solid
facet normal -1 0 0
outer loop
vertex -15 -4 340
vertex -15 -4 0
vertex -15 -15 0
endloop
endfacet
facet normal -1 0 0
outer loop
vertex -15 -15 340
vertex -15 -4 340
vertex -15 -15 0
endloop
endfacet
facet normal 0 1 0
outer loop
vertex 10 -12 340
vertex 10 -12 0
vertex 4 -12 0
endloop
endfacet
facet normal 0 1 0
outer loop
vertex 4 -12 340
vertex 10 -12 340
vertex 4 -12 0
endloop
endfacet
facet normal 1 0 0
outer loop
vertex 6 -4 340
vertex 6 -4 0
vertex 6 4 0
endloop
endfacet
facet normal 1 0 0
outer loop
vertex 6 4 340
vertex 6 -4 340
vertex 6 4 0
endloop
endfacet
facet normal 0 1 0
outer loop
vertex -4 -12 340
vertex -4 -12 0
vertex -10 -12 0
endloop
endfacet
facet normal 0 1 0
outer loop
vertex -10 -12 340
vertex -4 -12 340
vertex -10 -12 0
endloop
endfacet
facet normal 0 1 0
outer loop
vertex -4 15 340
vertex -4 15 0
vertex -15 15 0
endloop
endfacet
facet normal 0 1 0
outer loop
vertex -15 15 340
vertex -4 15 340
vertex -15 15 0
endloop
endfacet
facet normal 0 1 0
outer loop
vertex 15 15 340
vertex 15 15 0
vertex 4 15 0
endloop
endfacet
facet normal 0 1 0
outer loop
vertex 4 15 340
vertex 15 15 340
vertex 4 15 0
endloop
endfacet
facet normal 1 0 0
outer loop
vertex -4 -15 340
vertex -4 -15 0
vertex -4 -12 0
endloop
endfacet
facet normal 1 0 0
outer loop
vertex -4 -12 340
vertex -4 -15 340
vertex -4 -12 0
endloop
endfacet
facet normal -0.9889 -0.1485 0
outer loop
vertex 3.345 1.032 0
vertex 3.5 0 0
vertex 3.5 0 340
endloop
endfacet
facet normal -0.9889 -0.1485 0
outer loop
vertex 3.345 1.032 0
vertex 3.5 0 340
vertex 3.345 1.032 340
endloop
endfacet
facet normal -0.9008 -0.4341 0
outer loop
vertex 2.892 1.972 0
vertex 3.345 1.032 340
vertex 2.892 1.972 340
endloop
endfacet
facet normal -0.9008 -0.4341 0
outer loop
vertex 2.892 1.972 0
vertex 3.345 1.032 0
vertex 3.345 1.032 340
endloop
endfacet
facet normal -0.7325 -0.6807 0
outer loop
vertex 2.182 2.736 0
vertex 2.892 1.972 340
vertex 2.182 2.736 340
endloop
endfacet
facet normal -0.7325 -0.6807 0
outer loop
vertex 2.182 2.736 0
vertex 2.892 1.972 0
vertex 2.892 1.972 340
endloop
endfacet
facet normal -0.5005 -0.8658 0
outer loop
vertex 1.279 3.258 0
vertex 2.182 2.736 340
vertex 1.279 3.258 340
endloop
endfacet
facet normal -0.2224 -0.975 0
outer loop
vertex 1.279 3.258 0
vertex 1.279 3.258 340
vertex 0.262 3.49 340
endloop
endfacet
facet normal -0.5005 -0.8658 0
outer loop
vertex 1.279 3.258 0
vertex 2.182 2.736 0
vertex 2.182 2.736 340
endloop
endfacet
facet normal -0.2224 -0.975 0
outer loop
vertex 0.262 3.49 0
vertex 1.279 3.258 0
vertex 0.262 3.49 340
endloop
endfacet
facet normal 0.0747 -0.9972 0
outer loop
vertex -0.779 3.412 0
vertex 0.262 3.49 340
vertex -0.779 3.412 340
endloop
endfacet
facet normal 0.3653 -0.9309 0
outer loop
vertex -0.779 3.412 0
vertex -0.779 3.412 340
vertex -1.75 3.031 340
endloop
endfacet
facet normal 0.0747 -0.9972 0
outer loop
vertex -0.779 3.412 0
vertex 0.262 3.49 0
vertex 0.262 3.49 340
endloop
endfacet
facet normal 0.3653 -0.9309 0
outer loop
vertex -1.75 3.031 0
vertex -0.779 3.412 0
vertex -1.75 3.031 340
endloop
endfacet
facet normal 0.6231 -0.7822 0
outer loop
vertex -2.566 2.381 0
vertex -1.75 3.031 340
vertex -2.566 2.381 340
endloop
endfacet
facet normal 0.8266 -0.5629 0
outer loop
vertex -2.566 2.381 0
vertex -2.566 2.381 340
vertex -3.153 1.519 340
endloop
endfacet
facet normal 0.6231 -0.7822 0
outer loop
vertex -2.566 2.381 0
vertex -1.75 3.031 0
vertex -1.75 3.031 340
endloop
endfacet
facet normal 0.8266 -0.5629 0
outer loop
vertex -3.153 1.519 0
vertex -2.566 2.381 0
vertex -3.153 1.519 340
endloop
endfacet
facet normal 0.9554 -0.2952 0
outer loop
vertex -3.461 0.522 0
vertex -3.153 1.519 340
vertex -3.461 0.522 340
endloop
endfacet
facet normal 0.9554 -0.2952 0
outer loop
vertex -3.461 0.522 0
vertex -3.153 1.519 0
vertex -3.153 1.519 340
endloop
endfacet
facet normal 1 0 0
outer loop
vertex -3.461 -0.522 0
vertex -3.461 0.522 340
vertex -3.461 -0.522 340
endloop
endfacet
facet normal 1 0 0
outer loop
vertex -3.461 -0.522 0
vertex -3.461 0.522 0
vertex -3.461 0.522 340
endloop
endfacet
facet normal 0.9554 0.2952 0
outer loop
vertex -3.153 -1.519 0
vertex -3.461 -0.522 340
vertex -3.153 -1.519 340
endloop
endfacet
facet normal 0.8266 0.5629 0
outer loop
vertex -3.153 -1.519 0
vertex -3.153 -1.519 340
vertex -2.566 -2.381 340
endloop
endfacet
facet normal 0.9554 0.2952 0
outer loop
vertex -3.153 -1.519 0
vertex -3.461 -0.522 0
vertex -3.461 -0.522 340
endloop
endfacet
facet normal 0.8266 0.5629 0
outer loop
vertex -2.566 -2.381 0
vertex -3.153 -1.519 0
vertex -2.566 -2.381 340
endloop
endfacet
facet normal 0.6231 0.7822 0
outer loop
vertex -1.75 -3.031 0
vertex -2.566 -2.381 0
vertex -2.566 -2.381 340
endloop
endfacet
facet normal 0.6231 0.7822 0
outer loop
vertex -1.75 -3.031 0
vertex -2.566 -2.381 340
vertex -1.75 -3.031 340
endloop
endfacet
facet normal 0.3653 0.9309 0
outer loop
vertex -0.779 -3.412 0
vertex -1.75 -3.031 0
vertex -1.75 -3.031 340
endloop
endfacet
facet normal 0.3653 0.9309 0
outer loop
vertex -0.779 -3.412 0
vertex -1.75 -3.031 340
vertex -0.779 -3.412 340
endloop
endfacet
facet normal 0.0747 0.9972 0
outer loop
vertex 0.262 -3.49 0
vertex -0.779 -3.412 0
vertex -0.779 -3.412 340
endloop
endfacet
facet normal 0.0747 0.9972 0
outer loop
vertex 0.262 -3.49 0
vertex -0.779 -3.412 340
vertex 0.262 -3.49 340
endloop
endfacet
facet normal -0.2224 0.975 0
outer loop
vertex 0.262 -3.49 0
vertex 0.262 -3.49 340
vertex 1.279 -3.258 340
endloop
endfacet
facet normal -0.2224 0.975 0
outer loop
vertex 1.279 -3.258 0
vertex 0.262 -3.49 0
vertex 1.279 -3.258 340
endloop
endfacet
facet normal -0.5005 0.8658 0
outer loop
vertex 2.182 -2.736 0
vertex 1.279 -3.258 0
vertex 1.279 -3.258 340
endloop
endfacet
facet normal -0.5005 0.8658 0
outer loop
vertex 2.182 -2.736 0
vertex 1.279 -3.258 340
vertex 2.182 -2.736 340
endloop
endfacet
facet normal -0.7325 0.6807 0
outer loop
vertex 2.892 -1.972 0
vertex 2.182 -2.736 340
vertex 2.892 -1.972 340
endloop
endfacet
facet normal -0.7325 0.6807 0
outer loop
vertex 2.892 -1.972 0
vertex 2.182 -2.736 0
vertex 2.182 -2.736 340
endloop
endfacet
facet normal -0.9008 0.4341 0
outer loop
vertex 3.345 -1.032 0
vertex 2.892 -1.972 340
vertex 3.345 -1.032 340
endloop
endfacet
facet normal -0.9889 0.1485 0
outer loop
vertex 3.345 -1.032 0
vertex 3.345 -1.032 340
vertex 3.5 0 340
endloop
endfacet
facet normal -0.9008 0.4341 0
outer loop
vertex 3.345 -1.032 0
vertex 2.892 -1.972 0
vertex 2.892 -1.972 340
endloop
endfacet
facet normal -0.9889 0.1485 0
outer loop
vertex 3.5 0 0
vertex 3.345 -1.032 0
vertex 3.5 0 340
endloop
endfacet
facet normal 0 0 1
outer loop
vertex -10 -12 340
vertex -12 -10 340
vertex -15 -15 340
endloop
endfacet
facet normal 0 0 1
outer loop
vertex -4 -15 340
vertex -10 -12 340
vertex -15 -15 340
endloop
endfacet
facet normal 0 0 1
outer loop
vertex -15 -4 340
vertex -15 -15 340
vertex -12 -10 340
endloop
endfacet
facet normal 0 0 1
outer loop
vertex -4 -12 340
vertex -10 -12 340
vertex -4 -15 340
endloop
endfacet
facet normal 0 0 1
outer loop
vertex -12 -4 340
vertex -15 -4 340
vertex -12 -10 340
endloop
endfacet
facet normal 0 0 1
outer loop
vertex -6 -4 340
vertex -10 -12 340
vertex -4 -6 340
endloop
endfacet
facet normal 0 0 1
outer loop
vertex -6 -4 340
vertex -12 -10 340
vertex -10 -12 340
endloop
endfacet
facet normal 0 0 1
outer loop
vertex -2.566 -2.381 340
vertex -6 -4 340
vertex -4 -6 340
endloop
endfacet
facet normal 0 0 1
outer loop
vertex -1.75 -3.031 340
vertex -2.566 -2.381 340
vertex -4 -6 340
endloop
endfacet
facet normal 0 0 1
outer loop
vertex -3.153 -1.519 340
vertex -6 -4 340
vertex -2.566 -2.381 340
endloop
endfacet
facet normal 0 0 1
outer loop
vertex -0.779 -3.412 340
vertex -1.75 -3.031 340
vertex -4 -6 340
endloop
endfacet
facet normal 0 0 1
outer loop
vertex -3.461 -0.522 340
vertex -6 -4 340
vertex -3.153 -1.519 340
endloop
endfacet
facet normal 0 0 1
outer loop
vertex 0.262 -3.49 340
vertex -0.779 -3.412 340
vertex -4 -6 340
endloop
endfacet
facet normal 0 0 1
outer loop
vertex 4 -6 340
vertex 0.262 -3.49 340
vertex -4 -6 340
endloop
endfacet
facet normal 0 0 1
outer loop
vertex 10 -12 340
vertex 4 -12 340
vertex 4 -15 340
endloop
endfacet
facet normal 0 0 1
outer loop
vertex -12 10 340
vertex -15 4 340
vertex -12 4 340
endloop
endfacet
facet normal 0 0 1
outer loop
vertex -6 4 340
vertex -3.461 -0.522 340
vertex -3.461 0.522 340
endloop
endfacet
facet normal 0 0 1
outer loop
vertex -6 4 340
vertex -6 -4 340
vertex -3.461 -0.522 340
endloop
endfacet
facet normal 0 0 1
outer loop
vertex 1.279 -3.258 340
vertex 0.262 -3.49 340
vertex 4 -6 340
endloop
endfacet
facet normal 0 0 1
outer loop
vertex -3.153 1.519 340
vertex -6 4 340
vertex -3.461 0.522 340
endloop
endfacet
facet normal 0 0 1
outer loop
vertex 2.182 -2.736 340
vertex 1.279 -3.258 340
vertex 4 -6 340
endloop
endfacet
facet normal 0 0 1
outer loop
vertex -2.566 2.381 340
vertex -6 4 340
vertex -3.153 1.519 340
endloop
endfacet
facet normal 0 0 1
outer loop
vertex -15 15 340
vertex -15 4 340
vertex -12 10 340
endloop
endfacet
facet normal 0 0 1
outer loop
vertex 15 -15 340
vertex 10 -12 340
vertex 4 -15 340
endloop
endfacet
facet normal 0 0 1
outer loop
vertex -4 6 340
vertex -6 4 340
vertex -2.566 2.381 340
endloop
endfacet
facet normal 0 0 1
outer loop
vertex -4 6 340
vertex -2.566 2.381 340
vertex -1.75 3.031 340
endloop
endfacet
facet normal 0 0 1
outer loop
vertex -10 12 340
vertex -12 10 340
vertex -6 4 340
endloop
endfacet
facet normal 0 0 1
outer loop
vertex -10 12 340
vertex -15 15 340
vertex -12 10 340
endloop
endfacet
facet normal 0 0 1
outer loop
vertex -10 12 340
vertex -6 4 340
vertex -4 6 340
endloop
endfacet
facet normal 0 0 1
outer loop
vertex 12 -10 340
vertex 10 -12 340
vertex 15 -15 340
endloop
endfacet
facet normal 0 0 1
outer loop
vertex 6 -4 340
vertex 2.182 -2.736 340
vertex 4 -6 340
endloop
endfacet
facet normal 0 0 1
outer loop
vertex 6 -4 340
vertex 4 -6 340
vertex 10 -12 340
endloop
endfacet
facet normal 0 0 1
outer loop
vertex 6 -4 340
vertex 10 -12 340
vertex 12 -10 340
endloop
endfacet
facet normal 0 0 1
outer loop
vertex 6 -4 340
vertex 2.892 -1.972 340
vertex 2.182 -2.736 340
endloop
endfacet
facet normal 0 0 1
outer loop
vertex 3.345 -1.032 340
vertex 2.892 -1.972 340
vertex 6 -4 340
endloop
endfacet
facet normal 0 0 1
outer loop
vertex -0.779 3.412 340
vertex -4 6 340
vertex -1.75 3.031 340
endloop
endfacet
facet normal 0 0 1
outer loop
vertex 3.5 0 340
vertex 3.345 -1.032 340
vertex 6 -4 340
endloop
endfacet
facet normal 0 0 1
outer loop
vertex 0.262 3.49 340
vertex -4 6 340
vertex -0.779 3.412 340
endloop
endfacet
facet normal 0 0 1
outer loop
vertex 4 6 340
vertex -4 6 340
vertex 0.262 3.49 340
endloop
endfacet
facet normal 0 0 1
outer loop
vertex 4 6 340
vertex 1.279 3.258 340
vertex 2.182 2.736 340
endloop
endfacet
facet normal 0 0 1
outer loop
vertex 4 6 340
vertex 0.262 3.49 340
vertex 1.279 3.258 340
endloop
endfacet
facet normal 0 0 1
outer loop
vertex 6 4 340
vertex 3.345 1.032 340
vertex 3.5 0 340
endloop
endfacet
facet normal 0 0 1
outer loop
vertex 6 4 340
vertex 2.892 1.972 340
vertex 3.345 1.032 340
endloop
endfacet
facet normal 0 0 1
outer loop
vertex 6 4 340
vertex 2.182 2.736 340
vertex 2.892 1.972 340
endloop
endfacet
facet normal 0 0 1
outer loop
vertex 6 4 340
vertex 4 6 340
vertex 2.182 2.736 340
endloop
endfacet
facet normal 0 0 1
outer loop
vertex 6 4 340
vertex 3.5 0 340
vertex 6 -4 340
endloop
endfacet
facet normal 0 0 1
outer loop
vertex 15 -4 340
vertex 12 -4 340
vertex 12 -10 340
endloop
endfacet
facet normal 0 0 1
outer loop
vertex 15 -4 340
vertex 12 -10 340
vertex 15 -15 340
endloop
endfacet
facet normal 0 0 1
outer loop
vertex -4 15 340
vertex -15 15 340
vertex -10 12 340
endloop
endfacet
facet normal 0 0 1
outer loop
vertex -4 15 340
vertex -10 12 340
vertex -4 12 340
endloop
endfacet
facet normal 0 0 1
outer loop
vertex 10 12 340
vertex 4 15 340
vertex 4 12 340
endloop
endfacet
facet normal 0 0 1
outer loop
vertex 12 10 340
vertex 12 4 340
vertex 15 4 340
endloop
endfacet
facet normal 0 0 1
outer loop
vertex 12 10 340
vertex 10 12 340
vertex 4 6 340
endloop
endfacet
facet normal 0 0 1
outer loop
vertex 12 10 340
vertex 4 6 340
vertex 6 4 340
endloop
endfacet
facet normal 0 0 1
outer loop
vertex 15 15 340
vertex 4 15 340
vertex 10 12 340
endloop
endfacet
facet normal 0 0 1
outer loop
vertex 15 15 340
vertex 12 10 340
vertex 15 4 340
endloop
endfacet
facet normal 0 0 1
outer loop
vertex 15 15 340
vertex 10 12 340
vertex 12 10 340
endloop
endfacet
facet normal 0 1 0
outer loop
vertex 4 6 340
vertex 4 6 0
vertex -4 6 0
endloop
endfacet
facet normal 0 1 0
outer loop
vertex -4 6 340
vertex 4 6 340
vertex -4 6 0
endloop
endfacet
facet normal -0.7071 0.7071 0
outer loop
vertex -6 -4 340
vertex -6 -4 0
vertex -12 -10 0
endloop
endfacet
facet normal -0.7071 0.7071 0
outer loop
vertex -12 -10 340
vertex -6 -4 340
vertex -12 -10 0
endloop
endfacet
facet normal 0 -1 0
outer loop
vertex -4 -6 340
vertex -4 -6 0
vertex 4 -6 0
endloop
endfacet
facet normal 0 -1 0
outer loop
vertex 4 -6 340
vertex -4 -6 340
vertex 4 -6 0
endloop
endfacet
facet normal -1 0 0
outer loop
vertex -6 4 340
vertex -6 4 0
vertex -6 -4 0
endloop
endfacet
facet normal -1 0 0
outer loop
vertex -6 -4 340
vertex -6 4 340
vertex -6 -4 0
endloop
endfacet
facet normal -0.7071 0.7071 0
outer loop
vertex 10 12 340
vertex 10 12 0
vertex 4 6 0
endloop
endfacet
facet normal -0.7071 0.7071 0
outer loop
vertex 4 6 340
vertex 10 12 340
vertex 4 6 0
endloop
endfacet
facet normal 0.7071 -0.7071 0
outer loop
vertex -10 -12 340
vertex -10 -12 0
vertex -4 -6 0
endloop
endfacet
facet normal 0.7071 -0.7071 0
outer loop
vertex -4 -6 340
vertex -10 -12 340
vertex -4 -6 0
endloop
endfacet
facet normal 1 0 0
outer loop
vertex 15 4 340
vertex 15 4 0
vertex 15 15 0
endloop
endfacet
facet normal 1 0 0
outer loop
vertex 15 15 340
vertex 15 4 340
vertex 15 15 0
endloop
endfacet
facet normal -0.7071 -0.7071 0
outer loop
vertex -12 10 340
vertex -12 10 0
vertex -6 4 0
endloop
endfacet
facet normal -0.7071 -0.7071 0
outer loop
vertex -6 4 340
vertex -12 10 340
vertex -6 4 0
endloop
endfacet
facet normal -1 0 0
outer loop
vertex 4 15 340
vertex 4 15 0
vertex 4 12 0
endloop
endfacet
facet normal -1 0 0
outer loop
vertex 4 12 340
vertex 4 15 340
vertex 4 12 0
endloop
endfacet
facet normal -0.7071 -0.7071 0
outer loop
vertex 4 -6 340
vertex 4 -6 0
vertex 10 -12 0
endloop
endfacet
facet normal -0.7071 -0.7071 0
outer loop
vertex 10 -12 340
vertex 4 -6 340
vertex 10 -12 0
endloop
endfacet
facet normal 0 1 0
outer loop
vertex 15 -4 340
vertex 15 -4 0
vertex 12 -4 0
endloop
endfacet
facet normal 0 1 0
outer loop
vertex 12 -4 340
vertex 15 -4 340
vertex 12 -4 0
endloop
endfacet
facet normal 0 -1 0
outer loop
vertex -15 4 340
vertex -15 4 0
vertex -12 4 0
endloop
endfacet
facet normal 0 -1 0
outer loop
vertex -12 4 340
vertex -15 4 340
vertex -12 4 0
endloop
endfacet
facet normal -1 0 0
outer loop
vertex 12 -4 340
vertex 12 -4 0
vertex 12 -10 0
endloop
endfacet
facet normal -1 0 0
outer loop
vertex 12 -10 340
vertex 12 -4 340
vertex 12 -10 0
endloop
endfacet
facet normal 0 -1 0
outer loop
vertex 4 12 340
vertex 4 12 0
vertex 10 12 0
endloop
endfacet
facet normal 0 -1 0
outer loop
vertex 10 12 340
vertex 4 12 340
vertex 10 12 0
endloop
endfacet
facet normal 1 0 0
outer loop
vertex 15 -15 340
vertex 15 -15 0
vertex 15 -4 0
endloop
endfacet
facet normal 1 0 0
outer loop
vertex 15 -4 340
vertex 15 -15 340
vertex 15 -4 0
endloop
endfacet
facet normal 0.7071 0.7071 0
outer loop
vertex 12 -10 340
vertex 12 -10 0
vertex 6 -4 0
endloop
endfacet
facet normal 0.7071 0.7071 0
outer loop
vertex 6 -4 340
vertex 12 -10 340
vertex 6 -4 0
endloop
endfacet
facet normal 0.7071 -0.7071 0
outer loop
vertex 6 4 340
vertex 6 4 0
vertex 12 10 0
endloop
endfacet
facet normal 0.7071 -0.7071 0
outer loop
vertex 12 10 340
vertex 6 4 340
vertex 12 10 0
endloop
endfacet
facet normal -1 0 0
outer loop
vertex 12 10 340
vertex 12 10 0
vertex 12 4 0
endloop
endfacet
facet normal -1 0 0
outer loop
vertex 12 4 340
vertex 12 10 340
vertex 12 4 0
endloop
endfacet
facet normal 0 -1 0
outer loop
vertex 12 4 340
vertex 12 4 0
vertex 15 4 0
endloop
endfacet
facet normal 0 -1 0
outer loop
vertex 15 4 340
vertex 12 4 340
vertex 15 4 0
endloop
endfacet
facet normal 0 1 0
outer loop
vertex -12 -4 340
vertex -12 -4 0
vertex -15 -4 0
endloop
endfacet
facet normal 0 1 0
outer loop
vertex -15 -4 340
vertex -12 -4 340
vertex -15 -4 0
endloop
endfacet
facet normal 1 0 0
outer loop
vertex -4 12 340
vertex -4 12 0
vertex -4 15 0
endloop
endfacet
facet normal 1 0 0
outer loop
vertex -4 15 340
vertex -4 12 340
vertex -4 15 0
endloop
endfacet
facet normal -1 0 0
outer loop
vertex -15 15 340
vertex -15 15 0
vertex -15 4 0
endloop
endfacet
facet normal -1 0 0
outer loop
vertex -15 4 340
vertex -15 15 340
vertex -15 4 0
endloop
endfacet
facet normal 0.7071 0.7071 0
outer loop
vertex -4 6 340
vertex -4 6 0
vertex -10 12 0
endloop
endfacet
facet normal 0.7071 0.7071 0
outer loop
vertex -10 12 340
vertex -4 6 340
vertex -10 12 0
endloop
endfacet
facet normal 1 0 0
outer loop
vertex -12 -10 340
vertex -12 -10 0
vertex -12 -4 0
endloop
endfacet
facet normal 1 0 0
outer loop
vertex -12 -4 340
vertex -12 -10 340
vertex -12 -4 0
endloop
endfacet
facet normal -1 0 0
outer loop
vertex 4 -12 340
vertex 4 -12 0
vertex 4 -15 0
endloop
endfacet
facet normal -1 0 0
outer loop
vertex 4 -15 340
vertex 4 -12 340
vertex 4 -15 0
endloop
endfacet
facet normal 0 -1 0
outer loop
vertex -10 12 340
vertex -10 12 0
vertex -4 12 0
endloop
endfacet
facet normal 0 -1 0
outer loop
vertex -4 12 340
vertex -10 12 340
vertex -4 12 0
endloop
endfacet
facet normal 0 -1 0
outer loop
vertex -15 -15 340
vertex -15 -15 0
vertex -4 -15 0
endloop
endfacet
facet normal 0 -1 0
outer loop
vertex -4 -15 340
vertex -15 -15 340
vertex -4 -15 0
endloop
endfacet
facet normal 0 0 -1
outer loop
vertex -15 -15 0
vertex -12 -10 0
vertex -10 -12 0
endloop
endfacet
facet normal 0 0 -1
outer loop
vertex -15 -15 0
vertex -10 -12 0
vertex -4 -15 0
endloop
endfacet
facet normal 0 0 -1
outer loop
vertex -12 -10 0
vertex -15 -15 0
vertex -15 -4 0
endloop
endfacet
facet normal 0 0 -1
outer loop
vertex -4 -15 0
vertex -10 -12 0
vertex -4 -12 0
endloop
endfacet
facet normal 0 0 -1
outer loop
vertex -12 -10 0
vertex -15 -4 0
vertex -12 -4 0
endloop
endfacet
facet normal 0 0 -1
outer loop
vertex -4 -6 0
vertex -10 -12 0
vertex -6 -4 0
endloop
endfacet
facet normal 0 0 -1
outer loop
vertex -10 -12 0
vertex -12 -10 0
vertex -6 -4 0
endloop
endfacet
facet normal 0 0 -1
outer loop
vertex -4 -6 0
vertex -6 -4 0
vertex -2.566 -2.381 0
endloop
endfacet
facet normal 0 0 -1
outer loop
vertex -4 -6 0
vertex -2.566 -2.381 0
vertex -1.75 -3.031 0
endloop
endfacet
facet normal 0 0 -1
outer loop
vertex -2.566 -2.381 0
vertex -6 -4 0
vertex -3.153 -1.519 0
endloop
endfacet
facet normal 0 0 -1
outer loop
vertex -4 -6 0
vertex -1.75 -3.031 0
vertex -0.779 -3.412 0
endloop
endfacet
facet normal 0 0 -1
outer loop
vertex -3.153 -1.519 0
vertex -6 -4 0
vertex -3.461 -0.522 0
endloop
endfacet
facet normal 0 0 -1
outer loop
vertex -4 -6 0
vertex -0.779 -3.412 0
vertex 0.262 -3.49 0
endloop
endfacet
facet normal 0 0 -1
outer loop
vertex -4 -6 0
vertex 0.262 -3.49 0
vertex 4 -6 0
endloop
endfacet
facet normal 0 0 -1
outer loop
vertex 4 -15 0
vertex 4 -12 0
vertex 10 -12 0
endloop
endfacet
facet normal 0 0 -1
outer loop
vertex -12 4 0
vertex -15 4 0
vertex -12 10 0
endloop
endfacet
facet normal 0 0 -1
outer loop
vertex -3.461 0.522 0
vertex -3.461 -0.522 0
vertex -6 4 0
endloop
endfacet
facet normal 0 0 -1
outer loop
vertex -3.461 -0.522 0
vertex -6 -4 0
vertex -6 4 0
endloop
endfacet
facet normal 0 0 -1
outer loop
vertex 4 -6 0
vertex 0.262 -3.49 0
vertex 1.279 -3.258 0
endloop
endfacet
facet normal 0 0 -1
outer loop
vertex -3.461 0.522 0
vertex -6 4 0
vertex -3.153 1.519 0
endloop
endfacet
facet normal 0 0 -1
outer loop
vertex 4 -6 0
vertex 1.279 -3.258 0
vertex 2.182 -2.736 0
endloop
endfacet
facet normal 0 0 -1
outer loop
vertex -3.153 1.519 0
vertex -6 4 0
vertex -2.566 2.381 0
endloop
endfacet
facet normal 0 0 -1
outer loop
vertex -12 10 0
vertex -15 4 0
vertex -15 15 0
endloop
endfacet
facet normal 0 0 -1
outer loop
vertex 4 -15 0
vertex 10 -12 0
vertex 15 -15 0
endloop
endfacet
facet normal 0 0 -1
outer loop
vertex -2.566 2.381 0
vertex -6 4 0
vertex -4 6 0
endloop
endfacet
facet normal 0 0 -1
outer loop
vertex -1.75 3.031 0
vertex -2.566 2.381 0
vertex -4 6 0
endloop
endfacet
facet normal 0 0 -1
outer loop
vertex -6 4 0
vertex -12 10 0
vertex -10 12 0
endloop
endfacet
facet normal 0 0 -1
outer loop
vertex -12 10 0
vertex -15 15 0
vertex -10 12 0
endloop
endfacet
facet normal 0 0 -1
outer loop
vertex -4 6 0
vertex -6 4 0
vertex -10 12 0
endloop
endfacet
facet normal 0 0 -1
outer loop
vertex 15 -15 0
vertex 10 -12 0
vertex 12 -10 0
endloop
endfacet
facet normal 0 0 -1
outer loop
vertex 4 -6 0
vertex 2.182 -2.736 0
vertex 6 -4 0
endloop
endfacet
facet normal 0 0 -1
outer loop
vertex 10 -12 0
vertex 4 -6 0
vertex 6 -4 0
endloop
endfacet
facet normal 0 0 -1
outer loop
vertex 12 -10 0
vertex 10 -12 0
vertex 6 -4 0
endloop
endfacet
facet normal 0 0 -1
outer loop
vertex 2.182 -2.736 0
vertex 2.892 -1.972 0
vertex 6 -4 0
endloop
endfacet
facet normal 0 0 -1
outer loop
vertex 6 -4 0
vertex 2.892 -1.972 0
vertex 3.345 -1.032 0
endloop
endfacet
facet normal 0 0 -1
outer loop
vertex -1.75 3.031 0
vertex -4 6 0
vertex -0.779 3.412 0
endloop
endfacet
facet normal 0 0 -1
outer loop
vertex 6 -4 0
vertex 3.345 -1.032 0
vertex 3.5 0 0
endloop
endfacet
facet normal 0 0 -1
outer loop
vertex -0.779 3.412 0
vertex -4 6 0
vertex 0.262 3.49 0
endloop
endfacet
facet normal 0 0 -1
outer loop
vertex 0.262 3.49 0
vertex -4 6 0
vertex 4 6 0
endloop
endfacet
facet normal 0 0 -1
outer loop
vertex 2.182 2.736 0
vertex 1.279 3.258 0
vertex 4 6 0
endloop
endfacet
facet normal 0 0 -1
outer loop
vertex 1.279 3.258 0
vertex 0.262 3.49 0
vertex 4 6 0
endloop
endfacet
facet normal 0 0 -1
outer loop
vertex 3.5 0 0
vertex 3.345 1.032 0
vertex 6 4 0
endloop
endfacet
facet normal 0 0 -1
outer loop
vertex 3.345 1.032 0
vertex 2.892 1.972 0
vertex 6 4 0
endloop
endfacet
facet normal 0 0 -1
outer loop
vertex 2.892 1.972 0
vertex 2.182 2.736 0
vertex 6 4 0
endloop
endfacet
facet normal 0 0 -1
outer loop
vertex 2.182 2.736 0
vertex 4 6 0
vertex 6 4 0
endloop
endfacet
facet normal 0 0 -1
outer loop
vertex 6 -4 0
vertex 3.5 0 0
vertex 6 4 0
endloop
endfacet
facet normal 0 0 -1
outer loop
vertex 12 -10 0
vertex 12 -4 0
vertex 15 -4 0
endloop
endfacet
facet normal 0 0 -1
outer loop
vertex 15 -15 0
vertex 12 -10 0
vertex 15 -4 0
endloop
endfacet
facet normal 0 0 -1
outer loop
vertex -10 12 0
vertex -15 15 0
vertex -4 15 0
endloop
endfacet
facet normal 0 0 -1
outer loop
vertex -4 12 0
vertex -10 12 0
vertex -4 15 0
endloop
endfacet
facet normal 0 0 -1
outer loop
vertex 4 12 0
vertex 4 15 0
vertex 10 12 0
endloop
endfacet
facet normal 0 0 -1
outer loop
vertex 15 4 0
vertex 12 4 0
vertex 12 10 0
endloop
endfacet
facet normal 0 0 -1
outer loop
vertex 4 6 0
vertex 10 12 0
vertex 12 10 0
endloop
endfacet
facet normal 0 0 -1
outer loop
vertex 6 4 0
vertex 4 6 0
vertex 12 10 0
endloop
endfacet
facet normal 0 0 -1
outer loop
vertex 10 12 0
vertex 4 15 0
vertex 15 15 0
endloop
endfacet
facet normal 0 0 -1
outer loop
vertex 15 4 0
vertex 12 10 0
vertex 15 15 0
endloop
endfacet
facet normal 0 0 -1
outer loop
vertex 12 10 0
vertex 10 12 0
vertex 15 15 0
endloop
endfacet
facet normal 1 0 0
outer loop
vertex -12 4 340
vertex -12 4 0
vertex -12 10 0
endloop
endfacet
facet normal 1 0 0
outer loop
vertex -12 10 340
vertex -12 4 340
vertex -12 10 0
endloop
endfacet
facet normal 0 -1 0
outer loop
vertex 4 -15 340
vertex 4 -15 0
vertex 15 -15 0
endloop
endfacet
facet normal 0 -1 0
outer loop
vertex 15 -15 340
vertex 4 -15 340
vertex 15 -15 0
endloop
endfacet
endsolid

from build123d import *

# Parameters (mm, degrees)
F0_R     = 3.5
F1_DEPTH = 340


with BuildPart() as f1:
    # F0 (on Top) → F1 (new body)
    with BuildSketch(Plane.XY):
        Polygon((-4, 15), (-15, 15), (-15, 4), (-12, 4), (-12, 10), (-6, 4), (-6, 0), (-6, -4), (-12, -10), (-12, -4), (-15, -4), (-15, -15), (-4, -15), (-4, -12), (-10, -12), (-4, -6), (0, -6), (4, -6), (10, -12), (4, -12), (4, -15), (15, -15), (15, -4), (12, -4), (12, -10), (6, -4), (6, 0), (6, 4), (12, 10), (12, 4), (15, 4), (15, 15), (4, 15), (4, 12), (10, 12), (4, 6), (0, 6), (-4, 6), (-10, 12), (-4, 12), align=None)
        Circle(F0_R, mode=Mode.SUBTRACT)
    extrude(amount=F1_DEPTH)


solid = f1.part
